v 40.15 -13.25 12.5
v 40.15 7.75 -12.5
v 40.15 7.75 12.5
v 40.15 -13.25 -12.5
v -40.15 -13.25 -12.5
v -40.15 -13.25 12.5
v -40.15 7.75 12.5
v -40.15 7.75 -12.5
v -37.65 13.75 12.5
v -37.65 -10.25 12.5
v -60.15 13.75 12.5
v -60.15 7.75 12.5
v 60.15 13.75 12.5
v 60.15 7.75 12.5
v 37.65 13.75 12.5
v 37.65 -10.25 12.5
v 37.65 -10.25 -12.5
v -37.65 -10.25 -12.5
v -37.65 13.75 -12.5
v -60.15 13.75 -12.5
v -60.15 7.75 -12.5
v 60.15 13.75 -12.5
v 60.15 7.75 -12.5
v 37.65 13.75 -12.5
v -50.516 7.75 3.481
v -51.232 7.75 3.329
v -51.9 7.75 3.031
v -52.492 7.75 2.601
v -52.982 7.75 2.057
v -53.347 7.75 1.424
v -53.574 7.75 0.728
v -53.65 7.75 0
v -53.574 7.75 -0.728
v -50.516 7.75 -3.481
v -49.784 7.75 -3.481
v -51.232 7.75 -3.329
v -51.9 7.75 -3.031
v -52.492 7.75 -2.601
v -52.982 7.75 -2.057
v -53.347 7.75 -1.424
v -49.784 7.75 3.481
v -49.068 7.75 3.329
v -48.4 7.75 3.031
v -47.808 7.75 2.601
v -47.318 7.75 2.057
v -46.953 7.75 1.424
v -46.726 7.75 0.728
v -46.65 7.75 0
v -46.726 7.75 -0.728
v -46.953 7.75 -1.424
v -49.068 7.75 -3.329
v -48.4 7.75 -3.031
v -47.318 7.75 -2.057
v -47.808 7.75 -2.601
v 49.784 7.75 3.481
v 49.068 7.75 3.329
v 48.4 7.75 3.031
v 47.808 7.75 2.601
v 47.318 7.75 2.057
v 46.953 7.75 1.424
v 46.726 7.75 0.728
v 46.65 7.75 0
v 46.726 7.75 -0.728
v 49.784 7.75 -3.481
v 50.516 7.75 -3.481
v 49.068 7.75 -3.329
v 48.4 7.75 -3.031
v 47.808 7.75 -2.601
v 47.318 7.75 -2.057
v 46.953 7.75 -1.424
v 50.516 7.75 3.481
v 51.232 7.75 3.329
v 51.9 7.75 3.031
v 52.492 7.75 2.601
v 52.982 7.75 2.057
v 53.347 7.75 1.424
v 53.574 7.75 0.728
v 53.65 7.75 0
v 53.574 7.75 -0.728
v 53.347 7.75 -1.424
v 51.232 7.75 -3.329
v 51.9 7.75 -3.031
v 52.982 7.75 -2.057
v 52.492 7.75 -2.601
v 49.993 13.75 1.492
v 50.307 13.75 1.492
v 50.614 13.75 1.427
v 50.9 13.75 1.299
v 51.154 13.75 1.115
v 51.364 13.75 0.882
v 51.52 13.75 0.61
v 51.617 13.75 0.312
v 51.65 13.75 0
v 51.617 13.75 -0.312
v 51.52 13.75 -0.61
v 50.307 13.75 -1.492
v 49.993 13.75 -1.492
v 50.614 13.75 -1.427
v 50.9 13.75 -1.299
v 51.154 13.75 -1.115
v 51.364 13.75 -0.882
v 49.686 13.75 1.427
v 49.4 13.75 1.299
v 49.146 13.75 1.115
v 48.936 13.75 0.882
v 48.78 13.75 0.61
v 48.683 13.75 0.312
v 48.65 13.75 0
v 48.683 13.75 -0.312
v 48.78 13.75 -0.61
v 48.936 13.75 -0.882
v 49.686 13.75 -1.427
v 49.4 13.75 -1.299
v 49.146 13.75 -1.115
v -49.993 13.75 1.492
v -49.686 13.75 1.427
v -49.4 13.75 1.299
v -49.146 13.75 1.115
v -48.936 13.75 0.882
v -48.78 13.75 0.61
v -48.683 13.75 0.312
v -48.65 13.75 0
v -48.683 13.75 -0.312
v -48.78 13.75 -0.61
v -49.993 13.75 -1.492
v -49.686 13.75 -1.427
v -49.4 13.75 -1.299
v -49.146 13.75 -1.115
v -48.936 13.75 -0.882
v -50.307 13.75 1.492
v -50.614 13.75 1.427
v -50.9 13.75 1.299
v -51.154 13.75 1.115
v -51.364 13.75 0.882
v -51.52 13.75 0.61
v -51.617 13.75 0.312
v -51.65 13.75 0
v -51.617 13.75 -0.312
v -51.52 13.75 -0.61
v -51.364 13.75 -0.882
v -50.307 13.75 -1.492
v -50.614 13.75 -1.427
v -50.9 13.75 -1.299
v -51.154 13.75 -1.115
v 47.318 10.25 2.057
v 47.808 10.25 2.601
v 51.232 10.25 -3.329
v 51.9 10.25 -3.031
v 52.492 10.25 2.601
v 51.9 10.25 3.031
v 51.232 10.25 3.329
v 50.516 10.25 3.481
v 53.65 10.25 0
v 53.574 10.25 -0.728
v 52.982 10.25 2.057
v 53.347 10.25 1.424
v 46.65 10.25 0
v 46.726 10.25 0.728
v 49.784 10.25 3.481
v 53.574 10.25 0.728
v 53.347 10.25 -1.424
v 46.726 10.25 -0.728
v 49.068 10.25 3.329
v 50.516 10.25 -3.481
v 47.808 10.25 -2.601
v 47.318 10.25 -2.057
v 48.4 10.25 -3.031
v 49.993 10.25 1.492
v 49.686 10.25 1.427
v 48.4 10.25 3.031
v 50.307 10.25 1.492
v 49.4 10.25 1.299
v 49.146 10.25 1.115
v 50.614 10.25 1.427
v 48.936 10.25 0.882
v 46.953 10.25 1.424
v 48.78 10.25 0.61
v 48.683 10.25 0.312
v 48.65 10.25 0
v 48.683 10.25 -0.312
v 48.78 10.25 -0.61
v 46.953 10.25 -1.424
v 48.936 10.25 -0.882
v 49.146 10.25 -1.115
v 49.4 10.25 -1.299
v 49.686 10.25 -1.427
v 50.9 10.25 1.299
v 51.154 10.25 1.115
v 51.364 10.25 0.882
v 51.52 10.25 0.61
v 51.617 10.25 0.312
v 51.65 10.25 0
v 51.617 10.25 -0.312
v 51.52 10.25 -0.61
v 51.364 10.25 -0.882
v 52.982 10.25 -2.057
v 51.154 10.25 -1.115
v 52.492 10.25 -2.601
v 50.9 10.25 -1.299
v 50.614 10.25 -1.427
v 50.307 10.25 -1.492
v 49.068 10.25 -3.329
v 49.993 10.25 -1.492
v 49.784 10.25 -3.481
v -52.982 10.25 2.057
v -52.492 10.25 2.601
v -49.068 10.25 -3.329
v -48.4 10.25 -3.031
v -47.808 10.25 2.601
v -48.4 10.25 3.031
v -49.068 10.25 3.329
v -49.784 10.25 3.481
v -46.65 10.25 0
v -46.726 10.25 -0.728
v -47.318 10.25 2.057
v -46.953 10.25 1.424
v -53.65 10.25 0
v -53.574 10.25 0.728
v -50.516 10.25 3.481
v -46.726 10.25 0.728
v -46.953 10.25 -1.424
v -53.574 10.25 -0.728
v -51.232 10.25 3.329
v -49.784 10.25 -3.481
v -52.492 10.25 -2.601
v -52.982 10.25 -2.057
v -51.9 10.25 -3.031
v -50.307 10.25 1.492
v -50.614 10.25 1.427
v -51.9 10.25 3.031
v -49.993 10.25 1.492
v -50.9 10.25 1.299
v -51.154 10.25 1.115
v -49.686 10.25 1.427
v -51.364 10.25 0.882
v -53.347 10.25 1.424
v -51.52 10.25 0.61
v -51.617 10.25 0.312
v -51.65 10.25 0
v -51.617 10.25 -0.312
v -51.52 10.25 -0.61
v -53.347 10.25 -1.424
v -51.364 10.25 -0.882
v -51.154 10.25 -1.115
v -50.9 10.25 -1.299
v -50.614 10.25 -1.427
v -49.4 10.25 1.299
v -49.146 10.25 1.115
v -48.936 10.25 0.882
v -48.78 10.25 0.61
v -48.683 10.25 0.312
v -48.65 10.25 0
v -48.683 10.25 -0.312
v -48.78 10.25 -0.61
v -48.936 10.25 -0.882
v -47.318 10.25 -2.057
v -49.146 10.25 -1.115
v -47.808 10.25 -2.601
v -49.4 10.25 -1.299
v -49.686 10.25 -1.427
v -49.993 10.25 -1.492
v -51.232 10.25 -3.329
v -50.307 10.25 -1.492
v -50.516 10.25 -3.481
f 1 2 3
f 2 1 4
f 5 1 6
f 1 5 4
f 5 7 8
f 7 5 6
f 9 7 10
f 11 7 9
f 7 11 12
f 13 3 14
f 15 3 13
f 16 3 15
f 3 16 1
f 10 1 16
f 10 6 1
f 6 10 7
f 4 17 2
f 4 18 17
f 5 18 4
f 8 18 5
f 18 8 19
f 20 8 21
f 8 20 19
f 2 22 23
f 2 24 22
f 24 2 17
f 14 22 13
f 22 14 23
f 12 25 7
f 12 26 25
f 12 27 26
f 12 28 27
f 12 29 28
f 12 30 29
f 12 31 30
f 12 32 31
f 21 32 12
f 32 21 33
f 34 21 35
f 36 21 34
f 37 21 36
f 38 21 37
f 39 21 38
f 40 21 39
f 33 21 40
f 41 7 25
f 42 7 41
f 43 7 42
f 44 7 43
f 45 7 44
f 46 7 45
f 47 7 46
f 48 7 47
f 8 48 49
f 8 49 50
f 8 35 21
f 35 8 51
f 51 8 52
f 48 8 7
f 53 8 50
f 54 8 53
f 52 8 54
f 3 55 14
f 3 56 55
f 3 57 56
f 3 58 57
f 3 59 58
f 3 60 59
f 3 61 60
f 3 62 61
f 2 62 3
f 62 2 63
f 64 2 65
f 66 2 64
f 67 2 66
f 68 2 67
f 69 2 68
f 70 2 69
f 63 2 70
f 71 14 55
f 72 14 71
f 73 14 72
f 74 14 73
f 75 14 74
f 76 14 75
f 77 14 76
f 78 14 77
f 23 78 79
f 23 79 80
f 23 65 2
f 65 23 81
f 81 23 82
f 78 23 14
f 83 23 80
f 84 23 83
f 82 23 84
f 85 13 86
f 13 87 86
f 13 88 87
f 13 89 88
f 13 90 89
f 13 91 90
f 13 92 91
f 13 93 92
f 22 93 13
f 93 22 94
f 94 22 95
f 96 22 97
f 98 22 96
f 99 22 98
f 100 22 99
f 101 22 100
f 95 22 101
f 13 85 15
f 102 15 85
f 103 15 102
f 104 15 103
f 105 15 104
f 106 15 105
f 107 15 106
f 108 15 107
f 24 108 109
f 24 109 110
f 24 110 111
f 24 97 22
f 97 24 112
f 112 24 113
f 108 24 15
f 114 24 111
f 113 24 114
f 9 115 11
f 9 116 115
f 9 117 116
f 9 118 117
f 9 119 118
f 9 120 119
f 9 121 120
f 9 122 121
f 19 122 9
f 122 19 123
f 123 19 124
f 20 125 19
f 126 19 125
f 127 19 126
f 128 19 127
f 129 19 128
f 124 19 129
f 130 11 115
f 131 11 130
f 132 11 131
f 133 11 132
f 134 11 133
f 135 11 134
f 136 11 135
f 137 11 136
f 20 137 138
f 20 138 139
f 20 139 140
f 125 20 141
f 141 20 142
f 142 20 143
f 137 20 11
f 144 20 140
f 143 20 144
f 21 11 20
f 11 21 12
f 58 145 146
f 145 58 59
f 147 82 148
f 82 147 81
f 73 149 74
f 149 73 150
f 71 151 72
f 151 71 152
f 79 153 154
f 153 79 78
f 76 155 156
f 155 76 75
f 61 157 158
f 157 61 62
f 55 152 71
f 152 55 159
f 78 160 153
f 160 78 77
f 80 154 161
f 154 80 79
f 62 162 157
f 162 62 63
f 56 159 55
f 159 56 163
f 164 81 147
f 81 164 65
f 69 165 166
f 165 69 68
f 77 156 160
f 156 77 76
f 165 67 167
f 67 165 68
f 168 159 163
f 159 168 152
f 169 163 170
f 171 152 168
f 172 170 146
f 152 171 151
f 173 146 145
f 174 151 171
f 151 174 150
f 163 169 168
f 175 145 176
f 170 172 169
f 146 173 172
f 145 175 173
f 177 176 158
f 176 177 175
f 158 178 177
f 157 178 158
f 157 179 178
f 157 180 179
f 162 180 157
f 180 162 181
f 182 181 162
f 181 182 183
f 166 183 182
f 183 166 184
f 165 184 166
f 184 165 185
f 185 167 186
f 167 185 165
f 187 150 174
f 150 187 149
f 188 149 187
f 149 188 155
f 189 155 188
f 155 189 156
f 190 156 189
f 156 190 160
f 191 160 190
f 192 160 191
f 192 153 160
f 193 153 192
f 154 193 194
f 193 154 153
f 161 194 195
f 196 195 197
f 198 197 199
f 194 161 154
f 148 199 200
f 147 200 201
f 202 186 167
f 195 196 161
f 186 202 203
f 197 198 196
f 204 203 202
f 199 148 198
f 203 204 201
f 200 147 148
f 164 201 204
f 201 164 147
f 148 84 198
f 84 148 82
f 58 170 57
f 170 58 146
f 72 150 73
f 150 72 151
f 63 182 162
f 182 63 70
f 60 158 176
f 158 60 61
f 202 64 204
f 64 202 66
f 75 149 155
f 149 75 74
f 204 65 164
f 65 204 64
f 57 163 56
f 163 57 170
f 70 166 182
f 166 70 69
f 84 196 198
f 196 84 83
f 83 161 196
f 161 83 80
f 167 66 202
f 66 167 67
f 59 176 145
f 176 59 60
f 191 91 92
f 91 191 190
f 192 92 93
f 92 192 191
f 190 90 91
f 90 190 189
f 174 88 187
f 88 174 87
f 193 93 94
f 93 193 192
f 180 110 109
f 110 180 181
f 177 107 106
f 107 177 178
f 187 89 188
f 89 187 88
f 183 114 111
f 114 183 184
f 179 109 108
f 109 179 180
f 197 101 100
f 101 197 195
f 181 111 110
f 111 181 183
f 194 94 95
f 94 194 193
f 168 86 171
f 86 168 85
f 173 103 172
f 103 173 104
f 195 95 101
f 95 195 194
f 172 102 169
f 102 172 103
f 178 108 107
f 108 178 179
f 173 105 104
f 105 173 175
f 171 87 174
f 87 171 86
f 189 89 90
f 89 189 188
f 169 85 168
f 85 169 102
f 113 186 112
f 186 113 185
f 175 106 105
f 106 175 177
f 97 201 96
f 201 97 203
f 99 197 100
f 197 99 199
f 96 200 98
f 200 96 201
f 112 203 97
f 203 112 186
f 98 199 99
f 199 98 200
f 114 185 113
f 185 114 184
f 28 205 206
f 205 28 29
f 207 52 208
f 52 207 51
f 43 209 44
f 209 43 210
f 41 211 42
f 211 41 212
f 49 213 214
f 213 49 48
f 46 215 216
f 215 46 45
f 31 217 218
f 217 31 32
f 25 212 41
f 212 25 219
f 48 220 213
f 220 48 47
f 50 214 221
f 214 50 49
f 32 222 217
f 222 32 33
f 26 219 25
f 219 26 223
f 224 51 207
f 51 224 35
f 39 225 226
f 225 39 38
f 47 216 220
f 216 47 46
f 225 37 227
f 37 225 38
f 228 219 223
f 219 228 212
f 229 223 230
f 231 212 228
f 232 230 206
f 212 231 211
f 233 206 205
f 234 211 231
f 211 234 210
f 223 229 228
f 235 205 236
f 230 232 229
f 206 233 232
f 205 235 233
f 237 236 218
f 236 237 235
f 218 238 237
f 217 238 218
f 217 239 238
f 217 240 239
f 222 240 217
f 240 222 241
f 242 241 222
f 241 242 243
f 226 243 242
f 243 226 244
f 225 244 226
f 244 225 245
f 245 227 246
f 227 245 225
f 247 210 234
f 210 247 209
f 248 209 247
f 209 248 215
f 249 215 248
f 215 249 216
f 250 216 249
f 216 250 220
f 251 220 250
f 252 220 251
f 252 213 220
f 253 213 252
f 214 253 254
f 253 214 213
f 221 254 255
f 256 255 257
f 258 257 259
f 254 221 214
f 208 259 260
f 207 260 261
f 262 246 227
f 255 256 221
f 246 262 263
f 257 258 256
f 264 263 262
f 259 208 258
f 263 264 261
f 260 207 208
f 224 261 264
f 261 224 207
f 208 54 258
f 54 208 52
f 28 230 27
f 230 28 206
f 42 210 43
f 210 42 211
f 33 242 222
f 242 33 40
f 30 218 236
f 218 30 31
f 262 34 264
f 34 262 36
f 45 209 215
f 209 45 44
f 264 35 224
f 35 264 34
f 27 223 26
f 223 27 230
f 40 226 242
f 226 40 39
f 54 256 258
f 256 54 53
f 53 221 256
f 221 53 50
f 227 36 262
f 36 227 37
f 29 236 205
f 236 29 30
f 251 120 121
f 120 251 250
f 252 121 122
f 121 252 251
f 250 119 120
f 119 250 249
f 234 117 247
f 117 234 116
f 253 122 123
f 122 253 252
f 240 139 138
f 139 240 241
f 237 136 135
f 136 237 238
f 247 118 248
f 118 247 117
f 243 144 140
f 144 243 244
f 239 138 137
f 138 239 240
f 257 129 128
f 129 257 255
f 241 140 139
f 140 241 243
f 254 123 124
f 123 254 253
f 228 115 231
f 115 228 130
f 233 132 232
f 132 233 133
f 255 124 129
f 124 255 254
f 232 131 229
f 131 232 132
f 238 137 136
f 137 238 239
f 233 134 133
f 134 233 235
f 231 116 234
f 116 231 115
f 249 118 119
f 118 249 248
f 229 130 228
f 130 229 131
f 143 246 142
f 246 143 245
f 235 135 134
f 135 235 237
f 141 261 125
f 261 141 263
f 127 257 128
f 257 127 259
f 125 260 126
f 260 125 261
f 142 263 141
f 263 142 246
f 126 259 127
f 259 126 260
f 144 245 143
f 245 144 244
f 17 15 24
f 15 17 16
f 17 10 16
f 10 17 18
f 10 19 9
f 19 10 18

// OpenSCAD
$fn = $preview ? 15 : 30;

// How many mm to remove from the height, 
// so that screws will compress and hold the power supply firmly
COMPRESSION = 1;

// Caldigit TS3 Dock
POWER_SUPPLY_WIDTH = 75.3;
POWER_SUPPLY_HEIGHT = 25.0;

// LG Monitor
//POWER_SUPPLY_WIDTH = 86.5;
//POWER_SUPPLY_HEIGHT = 29.2;

BRACKET_LENGTH = 25;
BRACKET_THICKNESS = 2.5;
CORNER_RADIUS = 2;

SCREW_SIZE = 3;
SCREW_HEAD_SIZE = 7;
SCREW_HEAD_DEPTH = 2.5;
SCREW_TAB_THICKNESS = 6;
SCREW_TAB_WIDTH = 20;

module screw_hole(h) {
    translate([0, 0, -SCREW_HEAD_DEPTH])
        // Add 1mm to make sure it subtracts the top surface
        cylinder(h=SCREW_HEAD_DEPTH + 1, r=SCREW_HEAD_SIZE/2);
    translate([0, 0, -h])
        cylinder(h=h, r=SCREW_SIZE/2);
}

bracket_width = POWER_SUPPLY_WIDTH + BRACKET_THICKNESS * 2;
bracket_height = POWER_SUPPLY_HEIGHT + BRACKET_THICKNESS - COMPRESSION;

rotate([90, 0, 0])
difference() {
    union() {
        // Bracket
        cube([bracket_width, BRACKET_LENGTH, bracket_height], 
            center = true);

        // Screw tabs
        translate([0,0,POWER_SUPPLY_HEIGHT/-2 + (SCREW_TAB_THICKNESS - BRACKET_THICKNESS) / 2])
            cube([
                bracket_width + SCREW_TAB_WIDTH * 2, // one on each side 
                BRACKET_LENGTH,
                SCREW_TAB_THICKNESS
            ], center = true);
    };
    
    // Subtract screw holes
    screw_hole_x_offset = (bracket_width + SCREW_TAB_WIDTH)/2;
    for (x_offset = [screw_hole_x_offset, -screw_hole_x_offset])
        translate([
            x_offset, 0, (POWER_SUPPLY_HEIGHT - BRACKET_THICKNESS)/-2 + (SCREW_TAB_THICKNESS - BRACKET_THICKNESS)
        ])
            screw_hole(SCREW_TAB_THICKNESS*2);
    
    // Subtract power supply
    translate([0, 0, -BRACKET_THICKNESS/2 - 5 - COMPRESSION])
        cube([
            POWER_SUPPLY_WIDTH, 
            200, 
            POWER_SUPPLY_HEIGHT + 10
        ], center = true);
};
